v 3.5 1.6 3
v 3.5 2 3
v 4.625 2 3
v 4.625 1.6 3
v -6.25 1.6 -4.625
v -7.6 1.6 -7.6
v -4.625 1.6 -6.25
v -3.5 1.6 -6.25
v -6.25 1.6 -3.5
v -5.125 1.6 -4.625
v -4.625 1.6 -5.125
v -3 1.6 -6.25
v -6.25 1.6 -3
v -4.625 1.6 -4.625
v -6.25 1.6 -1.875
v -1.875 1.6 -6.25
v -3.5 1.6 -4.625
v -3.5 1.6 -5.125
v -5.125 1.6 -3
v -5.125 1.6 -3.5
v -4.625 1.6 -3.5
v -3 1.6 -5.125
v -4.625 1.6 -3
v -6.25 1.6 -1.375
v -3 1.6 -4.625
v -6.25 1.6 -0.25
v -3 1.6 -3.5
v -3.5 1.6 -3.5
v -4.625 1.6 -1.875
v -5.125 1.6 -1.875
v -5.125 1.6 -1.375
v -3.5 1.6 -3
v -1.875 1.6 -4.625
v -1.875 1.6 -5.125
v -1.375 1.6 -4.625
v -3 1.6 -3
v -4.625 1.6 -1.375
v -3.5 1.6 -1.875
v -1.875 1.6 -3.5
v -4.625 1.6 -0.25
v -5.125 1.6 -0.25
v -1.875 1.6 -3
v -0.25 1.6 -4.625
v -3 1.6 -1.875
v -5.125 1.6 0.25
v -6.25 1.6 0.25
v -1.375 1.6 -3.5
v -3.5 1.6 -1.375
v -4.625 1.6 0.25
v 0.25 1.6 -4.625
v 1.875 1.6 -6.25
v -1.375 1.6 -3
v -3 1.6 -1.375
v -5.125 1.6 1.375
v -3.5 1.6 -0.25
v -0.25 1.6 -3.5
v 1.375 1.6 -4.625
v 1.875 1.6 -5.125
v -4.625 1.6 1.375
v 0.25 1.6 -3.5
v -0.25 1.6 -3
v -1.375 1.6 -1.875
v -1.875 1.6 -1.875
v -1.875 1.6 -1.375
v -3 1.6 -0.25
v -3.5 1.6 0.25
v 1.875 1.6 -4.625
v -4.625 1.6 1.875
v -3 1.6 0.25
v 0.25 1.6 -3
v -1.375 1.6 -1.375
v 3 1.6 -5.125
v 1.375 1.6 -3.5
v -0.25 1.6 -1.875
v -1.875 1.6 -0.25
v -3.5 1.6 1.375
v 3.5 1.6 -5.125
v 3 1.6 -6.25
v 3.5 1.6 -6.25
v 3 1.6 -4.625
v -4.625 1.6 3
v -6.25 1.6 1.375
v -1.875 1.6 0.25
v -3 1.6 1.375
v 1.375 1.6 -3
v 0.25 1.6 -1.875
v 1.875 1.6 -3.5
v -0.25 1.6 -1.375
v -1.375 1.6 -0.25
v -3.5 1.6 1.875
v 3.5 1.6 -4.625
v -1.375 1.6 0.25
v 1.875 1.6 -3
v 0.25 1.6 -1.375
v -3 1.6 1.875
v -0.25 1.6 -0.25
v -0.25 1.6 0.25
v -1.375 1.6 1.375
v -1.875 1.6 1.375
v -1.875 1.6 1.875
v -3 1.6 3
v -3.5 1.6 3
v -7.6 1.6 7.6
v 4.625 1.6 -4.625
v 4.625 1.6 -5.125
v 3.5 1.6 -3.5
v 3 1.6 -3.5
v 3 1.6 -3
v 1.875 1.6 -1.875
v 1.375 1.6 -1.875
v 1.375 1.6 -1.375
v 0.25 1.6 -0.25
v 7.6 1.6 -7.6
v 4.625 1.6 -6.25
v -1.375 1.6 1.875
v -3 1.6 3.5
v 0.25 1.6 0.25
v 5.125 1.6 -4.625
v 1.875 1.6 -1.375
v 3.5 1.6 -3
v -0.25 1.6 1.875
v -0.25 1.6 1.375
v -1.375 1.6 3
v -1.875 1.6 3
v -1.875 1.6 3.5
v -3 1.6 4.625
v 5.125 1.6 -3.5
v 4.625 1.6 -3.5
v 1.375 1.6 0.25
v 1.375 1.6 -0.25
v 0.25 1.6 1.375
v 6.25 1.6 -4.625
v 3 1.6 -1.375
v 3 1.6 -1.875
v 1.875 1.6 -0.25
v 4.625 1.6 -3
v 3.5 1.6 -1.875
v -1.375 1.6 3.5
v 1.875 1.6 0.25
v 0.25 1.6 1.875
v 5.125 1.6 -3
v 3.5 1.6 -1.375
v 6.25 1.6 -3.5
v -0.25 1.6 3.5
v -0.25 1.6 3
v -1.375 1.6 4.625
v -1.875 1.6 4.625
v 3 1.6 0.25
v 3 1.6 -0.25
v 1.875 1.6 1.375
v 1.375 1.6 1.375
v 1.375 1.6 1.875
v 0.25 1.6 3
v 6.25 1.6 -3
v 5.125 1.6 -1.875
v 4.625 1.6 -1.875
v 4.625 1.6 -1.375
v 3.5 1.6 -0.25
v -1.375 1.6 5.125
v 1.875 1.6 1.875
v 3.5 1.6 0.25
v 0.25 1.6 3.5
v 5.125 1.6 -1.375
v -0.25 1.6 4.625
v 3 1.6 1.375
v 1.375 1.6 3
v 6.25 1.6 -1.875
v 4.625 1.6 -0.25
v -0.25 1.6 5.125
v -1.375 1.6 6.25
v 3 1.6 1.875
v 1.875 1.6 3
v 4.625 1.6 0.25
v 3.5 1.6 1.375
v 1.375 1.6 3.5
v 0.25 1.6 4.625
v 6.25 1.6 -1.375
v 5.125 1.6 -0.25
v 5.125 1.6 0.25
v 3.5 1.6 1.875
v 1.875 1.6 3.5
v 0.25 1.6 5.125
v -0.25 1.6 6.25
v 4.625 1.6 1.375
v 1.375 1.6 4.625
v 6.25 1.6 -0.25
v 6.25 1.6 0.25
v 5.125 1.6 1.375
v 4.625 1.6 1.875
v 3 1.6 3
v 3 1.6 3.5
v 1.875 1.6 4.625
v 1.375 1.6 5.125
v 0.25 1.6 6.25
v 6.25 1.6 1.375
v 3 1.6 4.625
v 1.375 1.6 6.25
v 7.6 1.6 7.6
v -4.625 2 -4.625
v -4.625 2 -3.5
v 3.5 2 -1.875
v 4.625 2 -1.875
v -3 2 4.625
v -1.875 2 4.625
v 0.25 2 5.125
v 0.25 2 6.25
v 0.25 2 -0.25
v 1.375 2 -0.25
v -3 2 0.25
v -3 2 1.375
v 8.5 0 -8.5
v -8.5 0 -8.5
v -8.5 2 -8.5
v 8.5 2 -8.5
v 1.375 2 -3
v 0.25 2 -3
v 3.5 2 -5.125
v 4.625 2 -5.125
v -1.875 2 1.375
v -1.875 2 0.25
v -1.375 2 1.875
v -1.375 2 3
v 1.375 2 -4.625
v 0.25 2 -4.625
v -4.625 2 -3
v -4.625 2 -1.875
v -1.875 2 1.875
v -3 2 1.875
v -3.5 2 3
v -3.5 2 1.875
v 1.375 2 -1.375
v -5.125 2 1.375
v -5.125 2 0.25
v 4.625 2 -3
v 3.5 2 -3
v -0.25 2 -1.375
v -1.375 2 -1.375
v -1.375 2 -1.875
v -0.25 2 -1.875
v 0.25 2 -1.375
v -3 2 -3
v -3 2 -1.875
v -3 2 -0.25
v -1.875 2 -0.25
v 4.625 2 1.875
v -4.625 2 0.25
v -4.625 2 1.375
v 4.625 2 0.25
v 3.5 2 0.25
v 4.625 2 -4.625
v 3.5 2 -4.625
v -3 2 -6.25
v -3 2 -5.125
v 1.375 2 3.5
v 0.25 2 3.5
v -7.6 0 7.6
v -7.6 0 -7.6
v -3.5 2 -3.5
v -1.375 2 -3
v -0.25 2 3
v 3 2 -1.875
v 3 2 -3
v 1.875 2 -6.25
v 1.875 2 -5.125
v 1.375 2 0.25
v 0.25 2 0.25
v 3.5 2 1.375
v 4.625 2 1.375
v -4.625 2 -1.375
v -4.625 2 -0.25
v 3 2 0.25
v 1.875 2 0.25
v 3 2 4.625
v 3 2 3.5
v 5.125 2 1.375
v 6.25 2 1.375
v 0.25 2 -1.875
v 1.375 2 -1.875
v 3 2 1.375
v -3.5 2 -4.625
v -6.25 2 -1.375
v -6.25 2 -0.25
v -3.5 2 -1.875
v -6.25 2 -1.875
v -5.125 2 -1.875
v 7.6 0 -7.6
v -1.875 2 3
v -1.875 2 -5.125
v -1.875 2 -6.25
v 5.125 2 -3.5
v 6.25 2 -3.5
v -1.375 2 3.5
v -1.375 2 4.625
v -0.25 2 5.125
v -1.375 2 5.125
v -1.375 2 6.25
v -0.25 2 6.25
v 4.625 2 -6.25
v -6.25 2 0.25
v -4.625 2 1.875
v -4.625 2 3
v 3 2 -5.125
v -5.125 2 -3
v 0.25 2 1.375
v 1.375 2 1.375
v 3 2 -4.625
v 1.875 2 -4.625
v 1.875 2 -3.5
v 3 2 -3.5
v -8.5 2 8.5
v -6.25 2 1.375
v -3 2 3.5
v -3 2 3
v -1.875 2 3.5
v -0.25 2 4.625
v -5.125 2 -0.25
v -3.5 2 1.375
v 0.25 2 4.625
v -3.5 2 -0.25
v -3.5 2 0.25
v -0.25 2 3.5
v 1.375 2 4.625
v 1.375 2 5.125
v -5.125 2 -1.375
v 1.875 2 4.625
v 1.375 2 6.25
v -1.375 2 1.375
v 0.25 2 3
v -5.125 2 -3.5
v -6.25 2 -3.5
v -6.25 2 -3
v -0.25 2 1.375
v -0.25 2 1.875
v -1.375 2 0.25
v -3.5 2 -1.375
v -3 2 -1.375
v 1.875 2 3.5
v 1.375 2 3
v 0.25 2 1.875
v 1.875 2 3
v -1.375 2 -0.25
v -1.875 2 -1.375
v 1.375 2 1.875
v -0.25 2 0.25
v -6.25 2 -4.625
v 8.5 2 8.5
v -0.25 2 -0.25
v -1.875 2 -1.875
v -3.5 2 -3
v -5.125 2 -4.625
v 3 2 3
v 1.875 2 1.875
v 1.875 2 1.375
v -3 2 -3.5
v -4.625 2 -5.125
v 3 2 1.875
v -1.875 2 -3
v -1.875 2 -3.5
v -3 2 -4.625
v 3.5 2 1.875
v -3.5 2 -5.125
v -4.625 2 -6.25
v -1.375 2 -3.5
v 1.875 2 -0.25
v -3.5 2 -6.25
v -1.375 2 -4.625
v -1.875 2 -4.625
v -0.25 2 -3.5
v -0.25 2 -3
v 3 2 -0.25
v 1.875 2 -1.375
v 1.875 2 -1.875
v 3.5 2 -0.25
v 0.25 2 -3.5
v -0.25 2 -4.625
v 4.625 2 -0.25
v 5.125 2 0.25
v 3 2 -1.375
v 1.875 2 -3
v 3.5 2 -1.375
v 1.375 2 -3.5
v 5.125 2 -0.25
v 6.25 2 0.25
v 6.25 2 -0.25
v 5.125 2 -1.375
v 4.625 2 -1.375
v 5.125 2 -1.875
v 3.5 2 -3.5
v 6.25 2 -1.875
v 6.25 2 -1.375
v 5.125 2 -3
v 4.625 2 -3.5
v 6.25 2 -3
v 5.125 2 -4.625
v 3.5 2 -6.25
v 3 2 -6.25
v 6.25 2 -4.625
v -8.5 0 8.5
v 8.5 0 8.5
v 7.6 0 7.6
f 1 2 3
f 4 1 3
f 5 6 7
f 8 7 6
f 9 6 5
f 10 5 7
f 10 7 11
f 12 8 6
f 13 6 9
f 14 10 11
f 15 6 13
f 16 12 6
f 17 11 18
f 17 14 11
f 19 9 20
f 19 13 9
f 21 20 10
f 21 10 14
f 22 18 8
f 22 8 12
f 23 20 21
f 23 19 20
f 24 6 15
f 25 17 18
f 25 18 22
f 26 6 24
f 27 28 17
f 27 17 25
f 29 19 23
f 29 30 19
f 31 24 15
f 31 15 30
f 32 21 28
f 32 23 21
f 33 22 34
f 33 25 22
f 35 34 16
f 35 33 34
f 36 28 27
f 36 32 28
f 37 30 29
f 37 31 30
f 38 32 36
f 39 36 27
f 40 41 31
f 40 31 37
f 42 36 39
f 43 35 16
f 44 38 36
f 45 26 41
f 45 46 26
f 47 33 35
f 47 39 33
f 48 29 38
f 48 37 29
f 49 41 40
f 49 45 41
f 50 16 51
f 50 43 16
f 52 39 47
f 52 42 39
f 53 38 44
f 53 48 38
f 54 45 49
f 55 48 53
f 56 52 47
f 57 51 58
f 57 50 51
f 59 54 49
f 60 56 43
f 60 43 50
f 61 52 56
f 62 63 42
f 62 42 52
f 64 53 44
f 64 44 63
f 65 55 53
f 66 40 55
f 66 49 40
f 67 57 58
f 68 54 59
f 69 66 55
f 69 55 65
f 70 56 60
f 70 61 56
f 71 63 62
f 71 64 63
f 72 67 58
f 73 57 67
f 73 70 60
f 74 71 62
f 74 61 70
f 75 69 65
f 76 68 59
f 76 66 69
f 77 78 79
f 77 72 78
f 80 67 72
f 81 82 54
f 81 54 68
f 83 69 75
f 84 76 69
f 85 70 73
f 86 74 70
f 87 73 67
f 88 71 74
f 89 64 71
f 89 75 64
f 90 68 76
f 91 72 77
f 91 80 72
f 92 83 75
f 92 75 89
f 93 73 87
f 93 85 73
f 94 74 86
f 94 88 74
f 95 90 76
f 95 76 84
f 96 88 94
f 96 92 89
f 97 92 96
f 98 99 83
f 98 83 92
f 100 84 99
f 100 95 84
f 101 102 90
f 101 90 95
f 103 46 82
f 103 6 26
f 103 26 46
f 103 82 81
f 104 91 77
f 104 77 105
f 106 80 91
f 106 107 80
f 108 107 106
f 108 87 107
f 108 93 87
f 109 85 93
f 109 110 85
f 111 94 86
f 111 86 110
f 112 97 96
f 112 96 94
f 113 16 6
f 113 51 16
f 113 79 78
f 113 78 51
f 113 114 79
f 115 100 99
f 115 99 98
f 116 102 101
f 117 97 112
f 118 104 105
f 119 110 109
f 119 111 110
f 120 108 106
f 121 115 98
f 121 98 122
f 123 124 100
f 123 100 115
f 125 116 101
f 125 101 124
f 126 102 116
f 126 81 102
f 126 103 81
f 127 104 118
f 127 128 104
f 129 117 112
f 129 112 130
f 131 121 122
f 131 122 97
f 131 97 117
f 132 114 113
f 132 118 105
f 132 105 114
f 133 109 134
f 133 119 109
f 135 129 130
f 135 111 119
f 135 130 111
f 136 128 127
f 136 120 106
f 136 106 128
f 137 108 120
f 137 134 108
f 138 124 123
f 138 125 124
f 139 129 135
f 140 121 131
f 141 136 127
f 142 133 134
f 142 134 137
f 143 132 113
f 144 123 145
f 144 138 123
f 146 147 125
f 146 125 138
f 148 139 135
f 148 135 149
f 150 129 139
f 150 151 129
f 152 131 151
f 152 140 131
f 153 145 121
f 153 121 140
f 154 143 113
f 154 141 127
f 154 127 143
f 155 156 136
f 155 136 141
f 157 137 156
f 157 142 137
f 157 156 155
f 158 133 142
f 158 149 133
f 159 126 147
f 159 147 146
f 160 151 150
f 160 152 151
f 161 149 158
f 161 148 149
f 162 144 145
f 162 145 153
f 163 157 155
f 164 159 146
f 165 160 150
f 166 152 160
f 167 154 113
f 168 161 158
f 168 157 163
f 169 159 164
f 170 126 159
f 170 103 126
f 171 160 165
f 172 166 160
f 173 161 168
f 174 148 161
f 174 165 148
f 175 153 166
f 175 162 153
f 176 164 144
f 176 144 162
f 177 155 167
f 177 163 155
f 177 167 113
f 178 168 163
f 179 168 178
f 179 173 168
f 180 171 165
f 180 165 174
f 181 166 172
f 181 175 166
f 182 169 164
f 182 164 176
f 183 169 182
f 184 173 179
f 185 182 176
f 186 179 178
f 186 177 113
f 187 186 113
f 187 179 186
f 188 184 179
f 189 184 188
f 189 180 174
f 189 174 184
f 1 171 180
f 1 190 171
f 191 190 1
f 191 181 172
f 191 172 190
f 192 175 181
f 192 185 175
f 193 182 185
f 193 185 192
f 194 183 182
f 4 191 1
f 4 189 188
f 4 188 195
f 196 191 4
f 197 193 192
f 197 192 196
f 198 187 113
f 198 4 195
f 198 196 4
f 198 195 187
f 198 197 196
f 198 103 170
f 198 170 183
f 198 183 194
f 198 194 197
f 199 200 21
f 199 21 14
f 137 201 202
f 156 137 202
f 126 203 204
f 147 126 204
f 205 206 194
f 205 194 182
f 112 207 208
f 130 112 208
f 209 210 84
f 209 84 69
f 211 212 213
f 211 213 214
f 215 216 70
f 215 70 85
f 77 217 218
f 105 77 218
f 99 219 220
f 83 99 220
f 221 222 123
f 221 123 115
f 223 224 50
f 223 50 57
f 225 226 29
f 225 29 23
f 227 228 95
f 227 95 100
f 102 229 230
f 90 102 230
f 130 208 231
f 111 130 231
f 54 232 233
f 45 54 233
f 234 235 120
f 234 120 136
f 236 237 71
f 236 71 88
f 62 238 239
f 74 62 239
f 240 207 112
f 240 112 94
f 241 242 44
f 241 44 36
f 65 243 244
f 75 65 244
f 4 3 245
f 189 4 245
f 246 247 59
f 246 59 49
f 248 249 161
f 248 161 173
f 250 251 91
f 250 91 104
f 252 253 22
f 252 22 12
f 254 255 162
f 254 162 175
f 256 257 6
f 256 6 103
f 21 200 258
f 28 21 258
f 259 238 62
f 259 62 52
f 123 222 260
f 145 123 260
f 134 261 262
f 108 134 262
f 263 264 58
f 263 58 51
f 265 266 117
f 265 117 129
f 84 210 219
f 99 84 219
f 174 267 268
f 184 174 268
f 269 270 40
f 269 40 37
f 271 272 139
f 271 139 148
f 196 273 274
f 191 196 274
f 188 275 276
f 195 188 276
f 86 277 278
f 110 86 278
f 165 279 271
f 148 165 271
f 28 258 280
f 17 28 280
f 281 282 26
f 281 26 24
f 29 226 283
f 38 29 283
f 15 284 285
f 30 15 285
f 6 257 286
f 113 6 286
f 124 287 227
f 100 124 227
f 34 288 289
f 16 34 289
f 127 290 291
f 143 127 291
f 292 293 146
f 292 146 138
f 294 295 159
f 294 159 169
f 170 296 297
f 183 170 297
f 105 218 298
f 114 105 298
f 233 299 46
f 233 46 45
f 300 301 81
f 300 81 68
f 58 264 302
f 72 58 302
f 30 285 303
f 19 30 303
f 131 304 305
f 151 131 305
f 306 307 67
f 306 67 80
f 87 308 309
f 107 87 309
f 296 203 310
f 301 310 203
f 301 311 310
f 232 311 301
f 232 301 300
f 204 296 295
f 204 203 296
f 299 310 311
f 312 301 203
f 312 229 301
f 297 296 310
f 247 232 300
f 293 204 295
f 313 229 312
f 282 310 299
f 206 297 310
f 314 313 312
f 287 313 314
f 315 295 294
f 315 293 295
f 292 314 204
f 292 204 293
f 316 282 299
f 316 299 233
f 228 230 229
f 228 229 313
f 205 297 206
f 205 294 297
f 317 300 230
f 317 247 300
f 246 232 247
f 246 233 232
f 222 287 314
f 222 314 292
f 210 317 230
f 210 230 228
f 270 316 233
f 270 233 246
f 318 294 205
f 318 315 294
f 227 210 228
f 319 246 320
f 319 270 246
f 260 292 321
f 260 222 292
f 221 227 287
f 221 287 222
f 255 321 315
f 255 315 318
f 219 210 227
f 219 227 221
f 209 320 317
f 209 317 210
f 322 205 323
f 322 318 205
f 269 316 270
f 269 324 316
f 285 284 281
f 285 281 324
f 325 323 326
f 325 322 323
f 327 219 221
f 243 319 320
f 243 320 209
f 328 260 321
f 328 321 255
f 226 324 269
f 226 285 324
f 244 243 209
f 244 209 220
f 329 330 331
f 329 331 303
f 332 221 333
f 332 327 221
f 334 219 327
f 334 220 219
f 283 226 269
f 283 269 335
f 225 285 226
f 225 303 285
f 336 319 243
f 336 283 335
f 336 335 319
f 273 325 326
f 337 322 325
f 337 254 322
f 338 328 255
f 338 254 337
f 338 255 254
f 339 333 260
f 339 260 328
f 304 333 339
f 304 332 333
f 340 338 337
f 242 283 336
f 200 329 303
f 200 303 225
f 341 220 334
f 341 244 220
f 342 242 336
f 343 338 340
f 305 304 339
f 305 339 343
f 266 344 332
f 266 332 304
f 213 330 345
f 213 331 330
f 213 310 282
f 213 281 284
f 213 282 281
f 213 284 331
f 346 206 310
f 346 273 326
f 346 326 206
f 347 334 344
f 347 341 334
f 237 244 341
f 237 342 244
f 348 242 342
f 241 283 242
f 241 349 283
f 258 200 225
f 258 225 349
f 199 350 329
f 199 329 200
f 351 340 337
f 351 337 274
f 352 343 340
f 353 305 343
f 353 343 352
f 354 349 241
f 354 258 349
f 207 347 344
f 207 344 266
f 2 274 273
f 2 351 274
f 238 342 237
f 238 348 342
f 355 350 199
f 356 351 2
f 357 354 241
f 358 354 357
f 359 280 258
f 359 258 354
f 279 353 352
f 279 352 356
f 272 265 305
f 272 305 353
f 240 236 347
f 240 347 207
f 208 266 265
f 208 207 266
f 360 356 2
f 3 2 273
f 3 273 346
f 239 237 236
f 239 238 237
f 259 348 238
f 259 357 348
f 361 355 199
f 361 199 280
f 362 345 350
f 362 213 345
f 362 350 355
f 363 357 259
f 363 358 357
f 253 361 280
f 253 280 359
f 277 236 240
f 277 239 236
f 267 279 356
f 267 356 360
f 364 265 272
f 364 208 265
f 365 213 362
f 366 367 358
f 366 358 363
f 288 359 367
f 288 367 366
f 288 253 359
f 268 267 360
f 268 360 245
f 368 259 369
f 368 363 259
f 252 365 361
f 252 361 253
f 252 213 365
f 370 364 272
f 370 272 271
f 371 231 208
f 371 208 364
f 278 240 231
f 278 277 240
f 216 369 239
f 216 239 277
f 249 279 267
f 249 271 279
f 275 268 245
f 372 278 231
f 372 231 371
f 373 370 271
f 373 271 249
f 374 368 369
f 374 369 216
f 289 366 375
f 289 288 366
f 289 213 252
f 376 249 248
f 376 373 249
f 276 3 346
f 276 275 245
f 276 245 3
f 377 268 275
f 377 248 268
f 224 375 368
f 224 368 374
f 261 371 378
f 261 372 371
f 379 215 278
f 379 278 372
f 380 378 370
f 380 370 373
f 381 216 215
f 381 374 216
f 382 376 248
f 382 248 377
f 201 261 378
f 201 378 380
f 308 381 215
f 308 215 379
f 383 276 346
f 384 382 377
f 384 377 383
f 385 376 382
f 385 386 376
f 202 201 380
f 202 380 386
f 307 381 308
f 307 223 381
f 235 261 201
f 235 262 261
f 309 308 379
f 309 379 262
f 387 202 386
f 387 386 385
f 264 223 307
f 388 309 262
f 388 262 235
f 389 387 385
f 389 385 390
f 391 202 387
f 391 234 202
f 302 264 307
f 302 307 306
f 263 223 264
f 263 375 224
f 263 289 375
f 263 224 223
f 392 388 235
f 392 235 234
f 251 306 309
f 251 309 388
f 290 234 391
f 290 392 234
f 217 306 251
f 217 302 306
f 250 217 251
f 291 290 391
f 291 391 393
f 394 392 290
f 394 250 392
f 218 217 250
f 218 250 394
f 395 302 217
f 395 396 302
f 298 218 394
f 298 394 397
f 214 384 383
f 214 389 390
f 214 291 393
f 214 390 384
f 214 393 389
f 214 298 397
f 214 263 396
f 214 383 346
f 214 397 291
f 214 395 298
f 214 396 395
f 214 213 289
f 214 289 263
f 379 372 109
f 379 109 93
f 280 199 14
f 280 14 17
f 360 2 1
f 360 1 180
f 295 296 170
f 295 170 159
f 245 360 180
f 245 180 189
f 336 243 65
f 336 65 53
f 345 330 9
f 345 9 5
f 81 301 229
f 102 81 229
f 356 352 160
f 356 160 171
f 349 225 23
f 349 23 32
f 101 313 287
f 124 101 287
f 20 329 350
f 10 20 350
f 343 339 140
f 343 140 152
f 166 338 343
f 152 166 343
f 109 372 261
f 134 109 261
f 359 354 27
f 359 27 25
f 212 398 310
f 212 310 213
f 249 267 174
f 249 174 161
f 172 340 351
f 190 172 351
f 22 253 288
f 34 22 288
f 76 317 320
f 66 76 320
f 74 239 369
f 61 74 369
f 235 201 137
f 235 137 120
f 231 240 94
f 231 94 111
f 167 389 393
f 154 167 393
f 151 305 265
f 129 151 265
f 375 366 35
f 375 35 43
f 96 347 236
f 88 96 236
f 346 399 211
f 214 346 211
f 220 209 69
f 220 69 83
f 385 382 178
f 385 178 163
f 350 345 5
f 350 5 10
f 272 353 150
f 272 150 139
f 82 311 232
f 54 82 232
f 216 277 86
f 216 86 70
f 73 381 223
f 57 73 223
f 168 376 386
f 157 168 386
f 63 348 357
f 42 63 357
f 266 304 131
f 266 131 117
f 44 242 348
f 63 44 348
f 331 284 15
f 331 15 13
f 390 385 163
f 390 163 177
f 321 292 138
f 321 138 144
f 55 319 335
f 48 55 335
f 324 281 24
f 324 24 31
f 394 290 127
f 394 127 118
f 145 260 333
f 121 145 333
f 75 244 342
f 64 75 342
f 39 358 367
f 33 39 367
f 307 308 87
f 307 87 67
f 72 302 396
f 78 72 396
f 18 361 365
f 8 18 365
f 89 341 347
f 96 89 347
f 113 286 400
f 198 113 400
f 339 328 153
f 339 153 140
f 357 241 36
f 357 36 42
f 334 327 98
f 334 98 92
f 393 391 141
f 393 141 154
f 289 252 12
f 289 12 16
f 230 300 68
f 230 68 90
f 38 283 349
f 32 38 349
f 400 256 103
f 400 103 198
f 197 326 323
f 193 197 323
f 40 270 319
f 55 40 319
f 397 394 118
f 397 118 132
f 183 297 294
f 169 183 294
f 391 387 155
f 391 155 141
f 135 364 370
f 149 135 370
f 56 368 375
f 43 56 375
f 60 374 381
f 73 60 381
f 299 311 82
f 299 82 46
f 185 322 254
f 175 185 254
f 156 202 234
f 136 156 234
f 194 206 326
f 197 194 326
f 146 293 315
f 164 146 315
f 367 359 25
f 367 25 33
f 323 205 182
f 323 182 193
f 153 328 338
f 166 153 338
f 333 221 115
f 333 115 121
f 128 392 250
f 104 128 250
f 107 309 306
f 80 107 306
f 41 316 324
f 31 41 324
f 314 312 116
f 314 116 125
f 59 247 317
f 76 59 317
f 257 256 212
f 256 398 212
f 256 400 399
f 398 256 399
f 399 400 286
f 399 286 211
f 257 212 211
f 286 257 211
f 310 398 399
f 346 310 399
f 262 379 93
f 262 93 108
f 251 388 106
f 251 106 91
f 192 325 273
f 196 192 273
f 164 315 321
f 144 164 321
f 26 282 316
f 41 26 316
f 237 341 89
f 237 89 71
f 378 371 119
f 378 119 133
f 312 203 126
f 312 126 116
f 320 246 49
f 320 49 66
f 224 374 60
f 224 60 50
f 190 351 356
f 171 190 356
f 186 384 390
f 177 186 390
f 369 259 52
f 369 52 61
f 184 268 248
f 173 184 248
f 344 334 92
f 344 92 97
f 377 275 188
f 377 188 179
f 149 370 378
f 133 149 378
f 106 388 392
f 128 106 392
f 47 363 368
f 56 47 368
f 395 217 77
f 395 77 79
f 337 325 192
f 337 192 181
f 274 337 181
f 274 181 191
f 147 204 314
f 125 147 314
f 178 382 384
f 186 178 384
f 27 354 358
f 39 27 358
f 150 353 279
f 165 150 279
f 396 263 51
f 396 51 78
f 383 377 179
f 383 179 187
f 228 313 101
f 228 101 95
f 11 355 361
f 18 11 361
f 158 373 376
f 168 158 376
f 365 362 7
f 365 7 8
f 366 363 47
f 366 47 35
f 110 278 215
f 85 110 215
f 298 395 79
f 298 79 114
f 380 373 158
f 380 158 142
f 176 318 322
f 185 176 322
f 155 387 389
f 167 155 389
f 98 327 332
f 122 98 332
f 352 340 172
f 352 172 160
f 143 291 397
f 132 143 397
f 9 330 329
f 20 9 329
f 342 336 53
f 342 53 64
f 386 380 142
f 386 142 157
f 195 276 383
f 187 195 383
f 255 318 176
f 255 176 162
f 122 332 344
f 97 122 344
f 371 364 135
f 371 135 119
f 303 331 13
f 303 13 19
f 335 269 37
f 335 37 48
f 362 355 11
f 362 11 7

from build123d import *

# Parameters (mm, degrees)
SKETCH1_W           = 17
SKETCH1_H           = 17
BOSS_EXTRUDE1_DEPTH = 2
SKETCH2_W           = 15.2
SKETCH2_H           = 15.2
CUT_EXTRUDE1_DEPTH  = 1.6
SKETCH3_W           = 1.125
SKETCH3_H           = 1.125
CUT_EXTRUDE2_DEPTH  = 3


with BuildPart() as part:
    # Sketch1 → Boss-Extrude1 (new body)
    with BuildSketch(Plane(origin=(0, 0, 0), x_dir=(1, 0, 0), z_dir=(0, 1, 0))):
        Rectangle(SKETCH1_W, SKETCH1_H)
    extrude(amount=BOSS_EXTRUDE1_DEPTH)

    # Sketch2 → Cut-Extrude1 (cut)
    with BuildSketch(Plane.XZ):
        Rectangle(SKETCH2_W, SKETCH2_H)
    extrude(amount=-CUT_EXTRUDE1_DEPTH, mode=Mode.SUBTRACT)

    # Sketch3 → Cut-Extrude2 (cut, through all)
    with BuildSketch(Plane(origin=(0, 2, 0), x_dir=(1, 0, 0), z_dir=(0, 1, 0))):
        with Locations((-4.0625, 5.6875)):
            Rectangle(SKETCH3_W, SKETCH3_H)
        with Locations((-2.4375, 5.6875)):
            Rectangle(SKETCH3_W, SKETCH3_H)
        with Locations((2.4375, 5.6875)):
            Rectangle(SKETCH3_W, SKETCH3_H)
        with Locations((4.0625, 5.6875)):
            Rectangle(SKETCH3_W, SKETCH3_H)
        with Locations((5.6875, 4.0625)):
            Rectangle(SKETCH3_W, SKETCH3_H)
        with Locations((5.6875, 2.4375)):
            Rectangle(SKETCH3_W, SKETCH3_H)
        with Locations((5.6875, 0.8125)):
            Rectangle(SKETCH3_W, SKETCH3_H)
        with Locations((-5.6875, 4.0625)):
            Rectangle(SKETCH3_W, SKETCH3_H)
        with Locations((-5.6875, 2.4375)):
            Rectangle(SKETCH3_W, SKETCH3_H)
        with Locations((-5.6875, 0.8125)):
            Rectangle(SKETCH3_W, SKETCH3_H)
        with Locations((-4.0625, -0.8125)):
            Rectangle(SKETCH3_W, SKETCH3_H)
        with Locations((-2.4375, -2.4375)):
            Rectangle(SKETCH3_W, SKETCH3_H)
        with Locations((-0.8125, -4.0625)):
            Rectangle(SKETCH3_W, SKETCH3_H)
        with Locations((0.8125, -4.0625)):
            Rectangle(SKETCH3_W, SKETCH3_H)
        with Locations((2.4375, -2.4375)):
            Rectangle(SKETCH3_W, SKETCH3_H)
        with Locations((4.0625, -0.8125)):
            Rectangle(SKETCH3_W, SKETCH3_H)
        with Locations((-0.8125, 4.0625)):
            Rectangle(SKETCH3_W, SKETCH3_H)
        with Locations((0.8125, 4.0625)):
            Rectangle(SKETCH3_W, SKETCH3_H)
        with Locations((-4.0625, 4.0625)):
            Rectangle(SKETCH3_W, SKETCH3_H)
        with Locations((-4.0625, 2.4375)):
            Rectangle(SKETCH3_W, SKETCH3_H)
        with Locations((-2.4375, 0.8125)):
            Rectangle(SKETCH3_W, SKETCH3_H)
        with Locations((-2.4375, 2.4375)):
            Rectangle(SKETCH3_W, SKETCH3_H)
        with Locations((-2.4375, 4.0625)):
            Rectangle(SKETCH3_W, SKETCH3_H)
        with Locations((-0.8125, 2.4375)):
            Rectangle(SKETCH3_W, SKETCH3_H)
        with Locations((0.8125, 2.4375)):
            Rectangle(SKETCH3_W, SKETCH3_H)
        with Locations((2.4375, 0.8125)):
            Rectangle(SKETCH3_W, SKETCH3_H)
        with Locations((2.4375, 2.4375)):
            Rectangle(SKETCH3_W, SKETCH3_H)
        with Locations((2.4375, 4.0625)):
            Rectangle(SKETCH3_W, SKETCH3_H)
        with Locations((4.0625, 2.4375)):
            Rectangle(SKETCH3_W, SKETCH3_H)
        with Locations((4.0625, 0.8125)):
            Rectangle(SKETCH3_W, SKETCH3_H)
        with Locations((2.4375, -0.8125)):
            Rectangle(SKETCH3_W, SKETCH3_H)
        with Locations((0.8125, -0.8125)):
            Rectangle(SKETCH3_W, SKETCH3_H)
        with Locations((-2.4375, -0.8125)):
            Rectangle(SKETCH3_W, SKETCH3_H)
        with Locations((-0.8125, -2.4375)):
            Rectangle(SKETCH3_W, SKETCH3_H)
        with Locations((0.8125, -2.4375)):
            Rectangle(SKETCH3_W, SKETCH3_H)
        with Locations((-0.8125, -0.8125)):
            Rectangle(SKETCH3_W, SKETCH3_H)
        with Locations((-4.0625, 0.8125)):
            Rectangle(SKETCH3_W, SKETCH3_H)
        with Locations((-0.8125, 0.8125)):
            Rectangle(SKETCH3_W, SKETCH3_H)
        with Locations((0.8125, 0.8125)):
            Rectangle(SKETCH3_W, SKETCH3_H)
        with Locations((4.0625, 4.0625)):
            Rectangle(SKETCH3_W, SKETCH3_H)
        with Locations((5.6875, -0.8125)):
            Rectangle(SKETCH3_W, SKETCH3_H)
        with Locations((4.0625, -2.4375)):
            Rectangle(SKETCH3_W, SKETCH3_H)
        with Locations((2.4375, -4.0625)):
            Rectangle(SKETCH3_W, SKETCH3_H)
        with Locations((0.8125, -5.6875)):
            Rectangle(SKETCH3_W, SKETCH3_H)
        with Locations((-0.8125, -5.6875)):
            Rectangle(SKETCH3_W, SKETCH3_H)
        with Locations((-2.4375, -4.0625)):
            Rectangle(SKETCH3_W, SKETCH3_H)
        with Locations((-4.0625, -2.4375)):
            Rectangle(SKETCH3_W, SKETCH3_H)
        with Locations((-5.6875, -0.8125)):
            Rectangle(SKETCH3_W, SKETCH3_H)
    extrude(amount=-CUT_EXTRUDE2_DEPTH, mode=Mode.SUBTRACT)


solid = part.part
